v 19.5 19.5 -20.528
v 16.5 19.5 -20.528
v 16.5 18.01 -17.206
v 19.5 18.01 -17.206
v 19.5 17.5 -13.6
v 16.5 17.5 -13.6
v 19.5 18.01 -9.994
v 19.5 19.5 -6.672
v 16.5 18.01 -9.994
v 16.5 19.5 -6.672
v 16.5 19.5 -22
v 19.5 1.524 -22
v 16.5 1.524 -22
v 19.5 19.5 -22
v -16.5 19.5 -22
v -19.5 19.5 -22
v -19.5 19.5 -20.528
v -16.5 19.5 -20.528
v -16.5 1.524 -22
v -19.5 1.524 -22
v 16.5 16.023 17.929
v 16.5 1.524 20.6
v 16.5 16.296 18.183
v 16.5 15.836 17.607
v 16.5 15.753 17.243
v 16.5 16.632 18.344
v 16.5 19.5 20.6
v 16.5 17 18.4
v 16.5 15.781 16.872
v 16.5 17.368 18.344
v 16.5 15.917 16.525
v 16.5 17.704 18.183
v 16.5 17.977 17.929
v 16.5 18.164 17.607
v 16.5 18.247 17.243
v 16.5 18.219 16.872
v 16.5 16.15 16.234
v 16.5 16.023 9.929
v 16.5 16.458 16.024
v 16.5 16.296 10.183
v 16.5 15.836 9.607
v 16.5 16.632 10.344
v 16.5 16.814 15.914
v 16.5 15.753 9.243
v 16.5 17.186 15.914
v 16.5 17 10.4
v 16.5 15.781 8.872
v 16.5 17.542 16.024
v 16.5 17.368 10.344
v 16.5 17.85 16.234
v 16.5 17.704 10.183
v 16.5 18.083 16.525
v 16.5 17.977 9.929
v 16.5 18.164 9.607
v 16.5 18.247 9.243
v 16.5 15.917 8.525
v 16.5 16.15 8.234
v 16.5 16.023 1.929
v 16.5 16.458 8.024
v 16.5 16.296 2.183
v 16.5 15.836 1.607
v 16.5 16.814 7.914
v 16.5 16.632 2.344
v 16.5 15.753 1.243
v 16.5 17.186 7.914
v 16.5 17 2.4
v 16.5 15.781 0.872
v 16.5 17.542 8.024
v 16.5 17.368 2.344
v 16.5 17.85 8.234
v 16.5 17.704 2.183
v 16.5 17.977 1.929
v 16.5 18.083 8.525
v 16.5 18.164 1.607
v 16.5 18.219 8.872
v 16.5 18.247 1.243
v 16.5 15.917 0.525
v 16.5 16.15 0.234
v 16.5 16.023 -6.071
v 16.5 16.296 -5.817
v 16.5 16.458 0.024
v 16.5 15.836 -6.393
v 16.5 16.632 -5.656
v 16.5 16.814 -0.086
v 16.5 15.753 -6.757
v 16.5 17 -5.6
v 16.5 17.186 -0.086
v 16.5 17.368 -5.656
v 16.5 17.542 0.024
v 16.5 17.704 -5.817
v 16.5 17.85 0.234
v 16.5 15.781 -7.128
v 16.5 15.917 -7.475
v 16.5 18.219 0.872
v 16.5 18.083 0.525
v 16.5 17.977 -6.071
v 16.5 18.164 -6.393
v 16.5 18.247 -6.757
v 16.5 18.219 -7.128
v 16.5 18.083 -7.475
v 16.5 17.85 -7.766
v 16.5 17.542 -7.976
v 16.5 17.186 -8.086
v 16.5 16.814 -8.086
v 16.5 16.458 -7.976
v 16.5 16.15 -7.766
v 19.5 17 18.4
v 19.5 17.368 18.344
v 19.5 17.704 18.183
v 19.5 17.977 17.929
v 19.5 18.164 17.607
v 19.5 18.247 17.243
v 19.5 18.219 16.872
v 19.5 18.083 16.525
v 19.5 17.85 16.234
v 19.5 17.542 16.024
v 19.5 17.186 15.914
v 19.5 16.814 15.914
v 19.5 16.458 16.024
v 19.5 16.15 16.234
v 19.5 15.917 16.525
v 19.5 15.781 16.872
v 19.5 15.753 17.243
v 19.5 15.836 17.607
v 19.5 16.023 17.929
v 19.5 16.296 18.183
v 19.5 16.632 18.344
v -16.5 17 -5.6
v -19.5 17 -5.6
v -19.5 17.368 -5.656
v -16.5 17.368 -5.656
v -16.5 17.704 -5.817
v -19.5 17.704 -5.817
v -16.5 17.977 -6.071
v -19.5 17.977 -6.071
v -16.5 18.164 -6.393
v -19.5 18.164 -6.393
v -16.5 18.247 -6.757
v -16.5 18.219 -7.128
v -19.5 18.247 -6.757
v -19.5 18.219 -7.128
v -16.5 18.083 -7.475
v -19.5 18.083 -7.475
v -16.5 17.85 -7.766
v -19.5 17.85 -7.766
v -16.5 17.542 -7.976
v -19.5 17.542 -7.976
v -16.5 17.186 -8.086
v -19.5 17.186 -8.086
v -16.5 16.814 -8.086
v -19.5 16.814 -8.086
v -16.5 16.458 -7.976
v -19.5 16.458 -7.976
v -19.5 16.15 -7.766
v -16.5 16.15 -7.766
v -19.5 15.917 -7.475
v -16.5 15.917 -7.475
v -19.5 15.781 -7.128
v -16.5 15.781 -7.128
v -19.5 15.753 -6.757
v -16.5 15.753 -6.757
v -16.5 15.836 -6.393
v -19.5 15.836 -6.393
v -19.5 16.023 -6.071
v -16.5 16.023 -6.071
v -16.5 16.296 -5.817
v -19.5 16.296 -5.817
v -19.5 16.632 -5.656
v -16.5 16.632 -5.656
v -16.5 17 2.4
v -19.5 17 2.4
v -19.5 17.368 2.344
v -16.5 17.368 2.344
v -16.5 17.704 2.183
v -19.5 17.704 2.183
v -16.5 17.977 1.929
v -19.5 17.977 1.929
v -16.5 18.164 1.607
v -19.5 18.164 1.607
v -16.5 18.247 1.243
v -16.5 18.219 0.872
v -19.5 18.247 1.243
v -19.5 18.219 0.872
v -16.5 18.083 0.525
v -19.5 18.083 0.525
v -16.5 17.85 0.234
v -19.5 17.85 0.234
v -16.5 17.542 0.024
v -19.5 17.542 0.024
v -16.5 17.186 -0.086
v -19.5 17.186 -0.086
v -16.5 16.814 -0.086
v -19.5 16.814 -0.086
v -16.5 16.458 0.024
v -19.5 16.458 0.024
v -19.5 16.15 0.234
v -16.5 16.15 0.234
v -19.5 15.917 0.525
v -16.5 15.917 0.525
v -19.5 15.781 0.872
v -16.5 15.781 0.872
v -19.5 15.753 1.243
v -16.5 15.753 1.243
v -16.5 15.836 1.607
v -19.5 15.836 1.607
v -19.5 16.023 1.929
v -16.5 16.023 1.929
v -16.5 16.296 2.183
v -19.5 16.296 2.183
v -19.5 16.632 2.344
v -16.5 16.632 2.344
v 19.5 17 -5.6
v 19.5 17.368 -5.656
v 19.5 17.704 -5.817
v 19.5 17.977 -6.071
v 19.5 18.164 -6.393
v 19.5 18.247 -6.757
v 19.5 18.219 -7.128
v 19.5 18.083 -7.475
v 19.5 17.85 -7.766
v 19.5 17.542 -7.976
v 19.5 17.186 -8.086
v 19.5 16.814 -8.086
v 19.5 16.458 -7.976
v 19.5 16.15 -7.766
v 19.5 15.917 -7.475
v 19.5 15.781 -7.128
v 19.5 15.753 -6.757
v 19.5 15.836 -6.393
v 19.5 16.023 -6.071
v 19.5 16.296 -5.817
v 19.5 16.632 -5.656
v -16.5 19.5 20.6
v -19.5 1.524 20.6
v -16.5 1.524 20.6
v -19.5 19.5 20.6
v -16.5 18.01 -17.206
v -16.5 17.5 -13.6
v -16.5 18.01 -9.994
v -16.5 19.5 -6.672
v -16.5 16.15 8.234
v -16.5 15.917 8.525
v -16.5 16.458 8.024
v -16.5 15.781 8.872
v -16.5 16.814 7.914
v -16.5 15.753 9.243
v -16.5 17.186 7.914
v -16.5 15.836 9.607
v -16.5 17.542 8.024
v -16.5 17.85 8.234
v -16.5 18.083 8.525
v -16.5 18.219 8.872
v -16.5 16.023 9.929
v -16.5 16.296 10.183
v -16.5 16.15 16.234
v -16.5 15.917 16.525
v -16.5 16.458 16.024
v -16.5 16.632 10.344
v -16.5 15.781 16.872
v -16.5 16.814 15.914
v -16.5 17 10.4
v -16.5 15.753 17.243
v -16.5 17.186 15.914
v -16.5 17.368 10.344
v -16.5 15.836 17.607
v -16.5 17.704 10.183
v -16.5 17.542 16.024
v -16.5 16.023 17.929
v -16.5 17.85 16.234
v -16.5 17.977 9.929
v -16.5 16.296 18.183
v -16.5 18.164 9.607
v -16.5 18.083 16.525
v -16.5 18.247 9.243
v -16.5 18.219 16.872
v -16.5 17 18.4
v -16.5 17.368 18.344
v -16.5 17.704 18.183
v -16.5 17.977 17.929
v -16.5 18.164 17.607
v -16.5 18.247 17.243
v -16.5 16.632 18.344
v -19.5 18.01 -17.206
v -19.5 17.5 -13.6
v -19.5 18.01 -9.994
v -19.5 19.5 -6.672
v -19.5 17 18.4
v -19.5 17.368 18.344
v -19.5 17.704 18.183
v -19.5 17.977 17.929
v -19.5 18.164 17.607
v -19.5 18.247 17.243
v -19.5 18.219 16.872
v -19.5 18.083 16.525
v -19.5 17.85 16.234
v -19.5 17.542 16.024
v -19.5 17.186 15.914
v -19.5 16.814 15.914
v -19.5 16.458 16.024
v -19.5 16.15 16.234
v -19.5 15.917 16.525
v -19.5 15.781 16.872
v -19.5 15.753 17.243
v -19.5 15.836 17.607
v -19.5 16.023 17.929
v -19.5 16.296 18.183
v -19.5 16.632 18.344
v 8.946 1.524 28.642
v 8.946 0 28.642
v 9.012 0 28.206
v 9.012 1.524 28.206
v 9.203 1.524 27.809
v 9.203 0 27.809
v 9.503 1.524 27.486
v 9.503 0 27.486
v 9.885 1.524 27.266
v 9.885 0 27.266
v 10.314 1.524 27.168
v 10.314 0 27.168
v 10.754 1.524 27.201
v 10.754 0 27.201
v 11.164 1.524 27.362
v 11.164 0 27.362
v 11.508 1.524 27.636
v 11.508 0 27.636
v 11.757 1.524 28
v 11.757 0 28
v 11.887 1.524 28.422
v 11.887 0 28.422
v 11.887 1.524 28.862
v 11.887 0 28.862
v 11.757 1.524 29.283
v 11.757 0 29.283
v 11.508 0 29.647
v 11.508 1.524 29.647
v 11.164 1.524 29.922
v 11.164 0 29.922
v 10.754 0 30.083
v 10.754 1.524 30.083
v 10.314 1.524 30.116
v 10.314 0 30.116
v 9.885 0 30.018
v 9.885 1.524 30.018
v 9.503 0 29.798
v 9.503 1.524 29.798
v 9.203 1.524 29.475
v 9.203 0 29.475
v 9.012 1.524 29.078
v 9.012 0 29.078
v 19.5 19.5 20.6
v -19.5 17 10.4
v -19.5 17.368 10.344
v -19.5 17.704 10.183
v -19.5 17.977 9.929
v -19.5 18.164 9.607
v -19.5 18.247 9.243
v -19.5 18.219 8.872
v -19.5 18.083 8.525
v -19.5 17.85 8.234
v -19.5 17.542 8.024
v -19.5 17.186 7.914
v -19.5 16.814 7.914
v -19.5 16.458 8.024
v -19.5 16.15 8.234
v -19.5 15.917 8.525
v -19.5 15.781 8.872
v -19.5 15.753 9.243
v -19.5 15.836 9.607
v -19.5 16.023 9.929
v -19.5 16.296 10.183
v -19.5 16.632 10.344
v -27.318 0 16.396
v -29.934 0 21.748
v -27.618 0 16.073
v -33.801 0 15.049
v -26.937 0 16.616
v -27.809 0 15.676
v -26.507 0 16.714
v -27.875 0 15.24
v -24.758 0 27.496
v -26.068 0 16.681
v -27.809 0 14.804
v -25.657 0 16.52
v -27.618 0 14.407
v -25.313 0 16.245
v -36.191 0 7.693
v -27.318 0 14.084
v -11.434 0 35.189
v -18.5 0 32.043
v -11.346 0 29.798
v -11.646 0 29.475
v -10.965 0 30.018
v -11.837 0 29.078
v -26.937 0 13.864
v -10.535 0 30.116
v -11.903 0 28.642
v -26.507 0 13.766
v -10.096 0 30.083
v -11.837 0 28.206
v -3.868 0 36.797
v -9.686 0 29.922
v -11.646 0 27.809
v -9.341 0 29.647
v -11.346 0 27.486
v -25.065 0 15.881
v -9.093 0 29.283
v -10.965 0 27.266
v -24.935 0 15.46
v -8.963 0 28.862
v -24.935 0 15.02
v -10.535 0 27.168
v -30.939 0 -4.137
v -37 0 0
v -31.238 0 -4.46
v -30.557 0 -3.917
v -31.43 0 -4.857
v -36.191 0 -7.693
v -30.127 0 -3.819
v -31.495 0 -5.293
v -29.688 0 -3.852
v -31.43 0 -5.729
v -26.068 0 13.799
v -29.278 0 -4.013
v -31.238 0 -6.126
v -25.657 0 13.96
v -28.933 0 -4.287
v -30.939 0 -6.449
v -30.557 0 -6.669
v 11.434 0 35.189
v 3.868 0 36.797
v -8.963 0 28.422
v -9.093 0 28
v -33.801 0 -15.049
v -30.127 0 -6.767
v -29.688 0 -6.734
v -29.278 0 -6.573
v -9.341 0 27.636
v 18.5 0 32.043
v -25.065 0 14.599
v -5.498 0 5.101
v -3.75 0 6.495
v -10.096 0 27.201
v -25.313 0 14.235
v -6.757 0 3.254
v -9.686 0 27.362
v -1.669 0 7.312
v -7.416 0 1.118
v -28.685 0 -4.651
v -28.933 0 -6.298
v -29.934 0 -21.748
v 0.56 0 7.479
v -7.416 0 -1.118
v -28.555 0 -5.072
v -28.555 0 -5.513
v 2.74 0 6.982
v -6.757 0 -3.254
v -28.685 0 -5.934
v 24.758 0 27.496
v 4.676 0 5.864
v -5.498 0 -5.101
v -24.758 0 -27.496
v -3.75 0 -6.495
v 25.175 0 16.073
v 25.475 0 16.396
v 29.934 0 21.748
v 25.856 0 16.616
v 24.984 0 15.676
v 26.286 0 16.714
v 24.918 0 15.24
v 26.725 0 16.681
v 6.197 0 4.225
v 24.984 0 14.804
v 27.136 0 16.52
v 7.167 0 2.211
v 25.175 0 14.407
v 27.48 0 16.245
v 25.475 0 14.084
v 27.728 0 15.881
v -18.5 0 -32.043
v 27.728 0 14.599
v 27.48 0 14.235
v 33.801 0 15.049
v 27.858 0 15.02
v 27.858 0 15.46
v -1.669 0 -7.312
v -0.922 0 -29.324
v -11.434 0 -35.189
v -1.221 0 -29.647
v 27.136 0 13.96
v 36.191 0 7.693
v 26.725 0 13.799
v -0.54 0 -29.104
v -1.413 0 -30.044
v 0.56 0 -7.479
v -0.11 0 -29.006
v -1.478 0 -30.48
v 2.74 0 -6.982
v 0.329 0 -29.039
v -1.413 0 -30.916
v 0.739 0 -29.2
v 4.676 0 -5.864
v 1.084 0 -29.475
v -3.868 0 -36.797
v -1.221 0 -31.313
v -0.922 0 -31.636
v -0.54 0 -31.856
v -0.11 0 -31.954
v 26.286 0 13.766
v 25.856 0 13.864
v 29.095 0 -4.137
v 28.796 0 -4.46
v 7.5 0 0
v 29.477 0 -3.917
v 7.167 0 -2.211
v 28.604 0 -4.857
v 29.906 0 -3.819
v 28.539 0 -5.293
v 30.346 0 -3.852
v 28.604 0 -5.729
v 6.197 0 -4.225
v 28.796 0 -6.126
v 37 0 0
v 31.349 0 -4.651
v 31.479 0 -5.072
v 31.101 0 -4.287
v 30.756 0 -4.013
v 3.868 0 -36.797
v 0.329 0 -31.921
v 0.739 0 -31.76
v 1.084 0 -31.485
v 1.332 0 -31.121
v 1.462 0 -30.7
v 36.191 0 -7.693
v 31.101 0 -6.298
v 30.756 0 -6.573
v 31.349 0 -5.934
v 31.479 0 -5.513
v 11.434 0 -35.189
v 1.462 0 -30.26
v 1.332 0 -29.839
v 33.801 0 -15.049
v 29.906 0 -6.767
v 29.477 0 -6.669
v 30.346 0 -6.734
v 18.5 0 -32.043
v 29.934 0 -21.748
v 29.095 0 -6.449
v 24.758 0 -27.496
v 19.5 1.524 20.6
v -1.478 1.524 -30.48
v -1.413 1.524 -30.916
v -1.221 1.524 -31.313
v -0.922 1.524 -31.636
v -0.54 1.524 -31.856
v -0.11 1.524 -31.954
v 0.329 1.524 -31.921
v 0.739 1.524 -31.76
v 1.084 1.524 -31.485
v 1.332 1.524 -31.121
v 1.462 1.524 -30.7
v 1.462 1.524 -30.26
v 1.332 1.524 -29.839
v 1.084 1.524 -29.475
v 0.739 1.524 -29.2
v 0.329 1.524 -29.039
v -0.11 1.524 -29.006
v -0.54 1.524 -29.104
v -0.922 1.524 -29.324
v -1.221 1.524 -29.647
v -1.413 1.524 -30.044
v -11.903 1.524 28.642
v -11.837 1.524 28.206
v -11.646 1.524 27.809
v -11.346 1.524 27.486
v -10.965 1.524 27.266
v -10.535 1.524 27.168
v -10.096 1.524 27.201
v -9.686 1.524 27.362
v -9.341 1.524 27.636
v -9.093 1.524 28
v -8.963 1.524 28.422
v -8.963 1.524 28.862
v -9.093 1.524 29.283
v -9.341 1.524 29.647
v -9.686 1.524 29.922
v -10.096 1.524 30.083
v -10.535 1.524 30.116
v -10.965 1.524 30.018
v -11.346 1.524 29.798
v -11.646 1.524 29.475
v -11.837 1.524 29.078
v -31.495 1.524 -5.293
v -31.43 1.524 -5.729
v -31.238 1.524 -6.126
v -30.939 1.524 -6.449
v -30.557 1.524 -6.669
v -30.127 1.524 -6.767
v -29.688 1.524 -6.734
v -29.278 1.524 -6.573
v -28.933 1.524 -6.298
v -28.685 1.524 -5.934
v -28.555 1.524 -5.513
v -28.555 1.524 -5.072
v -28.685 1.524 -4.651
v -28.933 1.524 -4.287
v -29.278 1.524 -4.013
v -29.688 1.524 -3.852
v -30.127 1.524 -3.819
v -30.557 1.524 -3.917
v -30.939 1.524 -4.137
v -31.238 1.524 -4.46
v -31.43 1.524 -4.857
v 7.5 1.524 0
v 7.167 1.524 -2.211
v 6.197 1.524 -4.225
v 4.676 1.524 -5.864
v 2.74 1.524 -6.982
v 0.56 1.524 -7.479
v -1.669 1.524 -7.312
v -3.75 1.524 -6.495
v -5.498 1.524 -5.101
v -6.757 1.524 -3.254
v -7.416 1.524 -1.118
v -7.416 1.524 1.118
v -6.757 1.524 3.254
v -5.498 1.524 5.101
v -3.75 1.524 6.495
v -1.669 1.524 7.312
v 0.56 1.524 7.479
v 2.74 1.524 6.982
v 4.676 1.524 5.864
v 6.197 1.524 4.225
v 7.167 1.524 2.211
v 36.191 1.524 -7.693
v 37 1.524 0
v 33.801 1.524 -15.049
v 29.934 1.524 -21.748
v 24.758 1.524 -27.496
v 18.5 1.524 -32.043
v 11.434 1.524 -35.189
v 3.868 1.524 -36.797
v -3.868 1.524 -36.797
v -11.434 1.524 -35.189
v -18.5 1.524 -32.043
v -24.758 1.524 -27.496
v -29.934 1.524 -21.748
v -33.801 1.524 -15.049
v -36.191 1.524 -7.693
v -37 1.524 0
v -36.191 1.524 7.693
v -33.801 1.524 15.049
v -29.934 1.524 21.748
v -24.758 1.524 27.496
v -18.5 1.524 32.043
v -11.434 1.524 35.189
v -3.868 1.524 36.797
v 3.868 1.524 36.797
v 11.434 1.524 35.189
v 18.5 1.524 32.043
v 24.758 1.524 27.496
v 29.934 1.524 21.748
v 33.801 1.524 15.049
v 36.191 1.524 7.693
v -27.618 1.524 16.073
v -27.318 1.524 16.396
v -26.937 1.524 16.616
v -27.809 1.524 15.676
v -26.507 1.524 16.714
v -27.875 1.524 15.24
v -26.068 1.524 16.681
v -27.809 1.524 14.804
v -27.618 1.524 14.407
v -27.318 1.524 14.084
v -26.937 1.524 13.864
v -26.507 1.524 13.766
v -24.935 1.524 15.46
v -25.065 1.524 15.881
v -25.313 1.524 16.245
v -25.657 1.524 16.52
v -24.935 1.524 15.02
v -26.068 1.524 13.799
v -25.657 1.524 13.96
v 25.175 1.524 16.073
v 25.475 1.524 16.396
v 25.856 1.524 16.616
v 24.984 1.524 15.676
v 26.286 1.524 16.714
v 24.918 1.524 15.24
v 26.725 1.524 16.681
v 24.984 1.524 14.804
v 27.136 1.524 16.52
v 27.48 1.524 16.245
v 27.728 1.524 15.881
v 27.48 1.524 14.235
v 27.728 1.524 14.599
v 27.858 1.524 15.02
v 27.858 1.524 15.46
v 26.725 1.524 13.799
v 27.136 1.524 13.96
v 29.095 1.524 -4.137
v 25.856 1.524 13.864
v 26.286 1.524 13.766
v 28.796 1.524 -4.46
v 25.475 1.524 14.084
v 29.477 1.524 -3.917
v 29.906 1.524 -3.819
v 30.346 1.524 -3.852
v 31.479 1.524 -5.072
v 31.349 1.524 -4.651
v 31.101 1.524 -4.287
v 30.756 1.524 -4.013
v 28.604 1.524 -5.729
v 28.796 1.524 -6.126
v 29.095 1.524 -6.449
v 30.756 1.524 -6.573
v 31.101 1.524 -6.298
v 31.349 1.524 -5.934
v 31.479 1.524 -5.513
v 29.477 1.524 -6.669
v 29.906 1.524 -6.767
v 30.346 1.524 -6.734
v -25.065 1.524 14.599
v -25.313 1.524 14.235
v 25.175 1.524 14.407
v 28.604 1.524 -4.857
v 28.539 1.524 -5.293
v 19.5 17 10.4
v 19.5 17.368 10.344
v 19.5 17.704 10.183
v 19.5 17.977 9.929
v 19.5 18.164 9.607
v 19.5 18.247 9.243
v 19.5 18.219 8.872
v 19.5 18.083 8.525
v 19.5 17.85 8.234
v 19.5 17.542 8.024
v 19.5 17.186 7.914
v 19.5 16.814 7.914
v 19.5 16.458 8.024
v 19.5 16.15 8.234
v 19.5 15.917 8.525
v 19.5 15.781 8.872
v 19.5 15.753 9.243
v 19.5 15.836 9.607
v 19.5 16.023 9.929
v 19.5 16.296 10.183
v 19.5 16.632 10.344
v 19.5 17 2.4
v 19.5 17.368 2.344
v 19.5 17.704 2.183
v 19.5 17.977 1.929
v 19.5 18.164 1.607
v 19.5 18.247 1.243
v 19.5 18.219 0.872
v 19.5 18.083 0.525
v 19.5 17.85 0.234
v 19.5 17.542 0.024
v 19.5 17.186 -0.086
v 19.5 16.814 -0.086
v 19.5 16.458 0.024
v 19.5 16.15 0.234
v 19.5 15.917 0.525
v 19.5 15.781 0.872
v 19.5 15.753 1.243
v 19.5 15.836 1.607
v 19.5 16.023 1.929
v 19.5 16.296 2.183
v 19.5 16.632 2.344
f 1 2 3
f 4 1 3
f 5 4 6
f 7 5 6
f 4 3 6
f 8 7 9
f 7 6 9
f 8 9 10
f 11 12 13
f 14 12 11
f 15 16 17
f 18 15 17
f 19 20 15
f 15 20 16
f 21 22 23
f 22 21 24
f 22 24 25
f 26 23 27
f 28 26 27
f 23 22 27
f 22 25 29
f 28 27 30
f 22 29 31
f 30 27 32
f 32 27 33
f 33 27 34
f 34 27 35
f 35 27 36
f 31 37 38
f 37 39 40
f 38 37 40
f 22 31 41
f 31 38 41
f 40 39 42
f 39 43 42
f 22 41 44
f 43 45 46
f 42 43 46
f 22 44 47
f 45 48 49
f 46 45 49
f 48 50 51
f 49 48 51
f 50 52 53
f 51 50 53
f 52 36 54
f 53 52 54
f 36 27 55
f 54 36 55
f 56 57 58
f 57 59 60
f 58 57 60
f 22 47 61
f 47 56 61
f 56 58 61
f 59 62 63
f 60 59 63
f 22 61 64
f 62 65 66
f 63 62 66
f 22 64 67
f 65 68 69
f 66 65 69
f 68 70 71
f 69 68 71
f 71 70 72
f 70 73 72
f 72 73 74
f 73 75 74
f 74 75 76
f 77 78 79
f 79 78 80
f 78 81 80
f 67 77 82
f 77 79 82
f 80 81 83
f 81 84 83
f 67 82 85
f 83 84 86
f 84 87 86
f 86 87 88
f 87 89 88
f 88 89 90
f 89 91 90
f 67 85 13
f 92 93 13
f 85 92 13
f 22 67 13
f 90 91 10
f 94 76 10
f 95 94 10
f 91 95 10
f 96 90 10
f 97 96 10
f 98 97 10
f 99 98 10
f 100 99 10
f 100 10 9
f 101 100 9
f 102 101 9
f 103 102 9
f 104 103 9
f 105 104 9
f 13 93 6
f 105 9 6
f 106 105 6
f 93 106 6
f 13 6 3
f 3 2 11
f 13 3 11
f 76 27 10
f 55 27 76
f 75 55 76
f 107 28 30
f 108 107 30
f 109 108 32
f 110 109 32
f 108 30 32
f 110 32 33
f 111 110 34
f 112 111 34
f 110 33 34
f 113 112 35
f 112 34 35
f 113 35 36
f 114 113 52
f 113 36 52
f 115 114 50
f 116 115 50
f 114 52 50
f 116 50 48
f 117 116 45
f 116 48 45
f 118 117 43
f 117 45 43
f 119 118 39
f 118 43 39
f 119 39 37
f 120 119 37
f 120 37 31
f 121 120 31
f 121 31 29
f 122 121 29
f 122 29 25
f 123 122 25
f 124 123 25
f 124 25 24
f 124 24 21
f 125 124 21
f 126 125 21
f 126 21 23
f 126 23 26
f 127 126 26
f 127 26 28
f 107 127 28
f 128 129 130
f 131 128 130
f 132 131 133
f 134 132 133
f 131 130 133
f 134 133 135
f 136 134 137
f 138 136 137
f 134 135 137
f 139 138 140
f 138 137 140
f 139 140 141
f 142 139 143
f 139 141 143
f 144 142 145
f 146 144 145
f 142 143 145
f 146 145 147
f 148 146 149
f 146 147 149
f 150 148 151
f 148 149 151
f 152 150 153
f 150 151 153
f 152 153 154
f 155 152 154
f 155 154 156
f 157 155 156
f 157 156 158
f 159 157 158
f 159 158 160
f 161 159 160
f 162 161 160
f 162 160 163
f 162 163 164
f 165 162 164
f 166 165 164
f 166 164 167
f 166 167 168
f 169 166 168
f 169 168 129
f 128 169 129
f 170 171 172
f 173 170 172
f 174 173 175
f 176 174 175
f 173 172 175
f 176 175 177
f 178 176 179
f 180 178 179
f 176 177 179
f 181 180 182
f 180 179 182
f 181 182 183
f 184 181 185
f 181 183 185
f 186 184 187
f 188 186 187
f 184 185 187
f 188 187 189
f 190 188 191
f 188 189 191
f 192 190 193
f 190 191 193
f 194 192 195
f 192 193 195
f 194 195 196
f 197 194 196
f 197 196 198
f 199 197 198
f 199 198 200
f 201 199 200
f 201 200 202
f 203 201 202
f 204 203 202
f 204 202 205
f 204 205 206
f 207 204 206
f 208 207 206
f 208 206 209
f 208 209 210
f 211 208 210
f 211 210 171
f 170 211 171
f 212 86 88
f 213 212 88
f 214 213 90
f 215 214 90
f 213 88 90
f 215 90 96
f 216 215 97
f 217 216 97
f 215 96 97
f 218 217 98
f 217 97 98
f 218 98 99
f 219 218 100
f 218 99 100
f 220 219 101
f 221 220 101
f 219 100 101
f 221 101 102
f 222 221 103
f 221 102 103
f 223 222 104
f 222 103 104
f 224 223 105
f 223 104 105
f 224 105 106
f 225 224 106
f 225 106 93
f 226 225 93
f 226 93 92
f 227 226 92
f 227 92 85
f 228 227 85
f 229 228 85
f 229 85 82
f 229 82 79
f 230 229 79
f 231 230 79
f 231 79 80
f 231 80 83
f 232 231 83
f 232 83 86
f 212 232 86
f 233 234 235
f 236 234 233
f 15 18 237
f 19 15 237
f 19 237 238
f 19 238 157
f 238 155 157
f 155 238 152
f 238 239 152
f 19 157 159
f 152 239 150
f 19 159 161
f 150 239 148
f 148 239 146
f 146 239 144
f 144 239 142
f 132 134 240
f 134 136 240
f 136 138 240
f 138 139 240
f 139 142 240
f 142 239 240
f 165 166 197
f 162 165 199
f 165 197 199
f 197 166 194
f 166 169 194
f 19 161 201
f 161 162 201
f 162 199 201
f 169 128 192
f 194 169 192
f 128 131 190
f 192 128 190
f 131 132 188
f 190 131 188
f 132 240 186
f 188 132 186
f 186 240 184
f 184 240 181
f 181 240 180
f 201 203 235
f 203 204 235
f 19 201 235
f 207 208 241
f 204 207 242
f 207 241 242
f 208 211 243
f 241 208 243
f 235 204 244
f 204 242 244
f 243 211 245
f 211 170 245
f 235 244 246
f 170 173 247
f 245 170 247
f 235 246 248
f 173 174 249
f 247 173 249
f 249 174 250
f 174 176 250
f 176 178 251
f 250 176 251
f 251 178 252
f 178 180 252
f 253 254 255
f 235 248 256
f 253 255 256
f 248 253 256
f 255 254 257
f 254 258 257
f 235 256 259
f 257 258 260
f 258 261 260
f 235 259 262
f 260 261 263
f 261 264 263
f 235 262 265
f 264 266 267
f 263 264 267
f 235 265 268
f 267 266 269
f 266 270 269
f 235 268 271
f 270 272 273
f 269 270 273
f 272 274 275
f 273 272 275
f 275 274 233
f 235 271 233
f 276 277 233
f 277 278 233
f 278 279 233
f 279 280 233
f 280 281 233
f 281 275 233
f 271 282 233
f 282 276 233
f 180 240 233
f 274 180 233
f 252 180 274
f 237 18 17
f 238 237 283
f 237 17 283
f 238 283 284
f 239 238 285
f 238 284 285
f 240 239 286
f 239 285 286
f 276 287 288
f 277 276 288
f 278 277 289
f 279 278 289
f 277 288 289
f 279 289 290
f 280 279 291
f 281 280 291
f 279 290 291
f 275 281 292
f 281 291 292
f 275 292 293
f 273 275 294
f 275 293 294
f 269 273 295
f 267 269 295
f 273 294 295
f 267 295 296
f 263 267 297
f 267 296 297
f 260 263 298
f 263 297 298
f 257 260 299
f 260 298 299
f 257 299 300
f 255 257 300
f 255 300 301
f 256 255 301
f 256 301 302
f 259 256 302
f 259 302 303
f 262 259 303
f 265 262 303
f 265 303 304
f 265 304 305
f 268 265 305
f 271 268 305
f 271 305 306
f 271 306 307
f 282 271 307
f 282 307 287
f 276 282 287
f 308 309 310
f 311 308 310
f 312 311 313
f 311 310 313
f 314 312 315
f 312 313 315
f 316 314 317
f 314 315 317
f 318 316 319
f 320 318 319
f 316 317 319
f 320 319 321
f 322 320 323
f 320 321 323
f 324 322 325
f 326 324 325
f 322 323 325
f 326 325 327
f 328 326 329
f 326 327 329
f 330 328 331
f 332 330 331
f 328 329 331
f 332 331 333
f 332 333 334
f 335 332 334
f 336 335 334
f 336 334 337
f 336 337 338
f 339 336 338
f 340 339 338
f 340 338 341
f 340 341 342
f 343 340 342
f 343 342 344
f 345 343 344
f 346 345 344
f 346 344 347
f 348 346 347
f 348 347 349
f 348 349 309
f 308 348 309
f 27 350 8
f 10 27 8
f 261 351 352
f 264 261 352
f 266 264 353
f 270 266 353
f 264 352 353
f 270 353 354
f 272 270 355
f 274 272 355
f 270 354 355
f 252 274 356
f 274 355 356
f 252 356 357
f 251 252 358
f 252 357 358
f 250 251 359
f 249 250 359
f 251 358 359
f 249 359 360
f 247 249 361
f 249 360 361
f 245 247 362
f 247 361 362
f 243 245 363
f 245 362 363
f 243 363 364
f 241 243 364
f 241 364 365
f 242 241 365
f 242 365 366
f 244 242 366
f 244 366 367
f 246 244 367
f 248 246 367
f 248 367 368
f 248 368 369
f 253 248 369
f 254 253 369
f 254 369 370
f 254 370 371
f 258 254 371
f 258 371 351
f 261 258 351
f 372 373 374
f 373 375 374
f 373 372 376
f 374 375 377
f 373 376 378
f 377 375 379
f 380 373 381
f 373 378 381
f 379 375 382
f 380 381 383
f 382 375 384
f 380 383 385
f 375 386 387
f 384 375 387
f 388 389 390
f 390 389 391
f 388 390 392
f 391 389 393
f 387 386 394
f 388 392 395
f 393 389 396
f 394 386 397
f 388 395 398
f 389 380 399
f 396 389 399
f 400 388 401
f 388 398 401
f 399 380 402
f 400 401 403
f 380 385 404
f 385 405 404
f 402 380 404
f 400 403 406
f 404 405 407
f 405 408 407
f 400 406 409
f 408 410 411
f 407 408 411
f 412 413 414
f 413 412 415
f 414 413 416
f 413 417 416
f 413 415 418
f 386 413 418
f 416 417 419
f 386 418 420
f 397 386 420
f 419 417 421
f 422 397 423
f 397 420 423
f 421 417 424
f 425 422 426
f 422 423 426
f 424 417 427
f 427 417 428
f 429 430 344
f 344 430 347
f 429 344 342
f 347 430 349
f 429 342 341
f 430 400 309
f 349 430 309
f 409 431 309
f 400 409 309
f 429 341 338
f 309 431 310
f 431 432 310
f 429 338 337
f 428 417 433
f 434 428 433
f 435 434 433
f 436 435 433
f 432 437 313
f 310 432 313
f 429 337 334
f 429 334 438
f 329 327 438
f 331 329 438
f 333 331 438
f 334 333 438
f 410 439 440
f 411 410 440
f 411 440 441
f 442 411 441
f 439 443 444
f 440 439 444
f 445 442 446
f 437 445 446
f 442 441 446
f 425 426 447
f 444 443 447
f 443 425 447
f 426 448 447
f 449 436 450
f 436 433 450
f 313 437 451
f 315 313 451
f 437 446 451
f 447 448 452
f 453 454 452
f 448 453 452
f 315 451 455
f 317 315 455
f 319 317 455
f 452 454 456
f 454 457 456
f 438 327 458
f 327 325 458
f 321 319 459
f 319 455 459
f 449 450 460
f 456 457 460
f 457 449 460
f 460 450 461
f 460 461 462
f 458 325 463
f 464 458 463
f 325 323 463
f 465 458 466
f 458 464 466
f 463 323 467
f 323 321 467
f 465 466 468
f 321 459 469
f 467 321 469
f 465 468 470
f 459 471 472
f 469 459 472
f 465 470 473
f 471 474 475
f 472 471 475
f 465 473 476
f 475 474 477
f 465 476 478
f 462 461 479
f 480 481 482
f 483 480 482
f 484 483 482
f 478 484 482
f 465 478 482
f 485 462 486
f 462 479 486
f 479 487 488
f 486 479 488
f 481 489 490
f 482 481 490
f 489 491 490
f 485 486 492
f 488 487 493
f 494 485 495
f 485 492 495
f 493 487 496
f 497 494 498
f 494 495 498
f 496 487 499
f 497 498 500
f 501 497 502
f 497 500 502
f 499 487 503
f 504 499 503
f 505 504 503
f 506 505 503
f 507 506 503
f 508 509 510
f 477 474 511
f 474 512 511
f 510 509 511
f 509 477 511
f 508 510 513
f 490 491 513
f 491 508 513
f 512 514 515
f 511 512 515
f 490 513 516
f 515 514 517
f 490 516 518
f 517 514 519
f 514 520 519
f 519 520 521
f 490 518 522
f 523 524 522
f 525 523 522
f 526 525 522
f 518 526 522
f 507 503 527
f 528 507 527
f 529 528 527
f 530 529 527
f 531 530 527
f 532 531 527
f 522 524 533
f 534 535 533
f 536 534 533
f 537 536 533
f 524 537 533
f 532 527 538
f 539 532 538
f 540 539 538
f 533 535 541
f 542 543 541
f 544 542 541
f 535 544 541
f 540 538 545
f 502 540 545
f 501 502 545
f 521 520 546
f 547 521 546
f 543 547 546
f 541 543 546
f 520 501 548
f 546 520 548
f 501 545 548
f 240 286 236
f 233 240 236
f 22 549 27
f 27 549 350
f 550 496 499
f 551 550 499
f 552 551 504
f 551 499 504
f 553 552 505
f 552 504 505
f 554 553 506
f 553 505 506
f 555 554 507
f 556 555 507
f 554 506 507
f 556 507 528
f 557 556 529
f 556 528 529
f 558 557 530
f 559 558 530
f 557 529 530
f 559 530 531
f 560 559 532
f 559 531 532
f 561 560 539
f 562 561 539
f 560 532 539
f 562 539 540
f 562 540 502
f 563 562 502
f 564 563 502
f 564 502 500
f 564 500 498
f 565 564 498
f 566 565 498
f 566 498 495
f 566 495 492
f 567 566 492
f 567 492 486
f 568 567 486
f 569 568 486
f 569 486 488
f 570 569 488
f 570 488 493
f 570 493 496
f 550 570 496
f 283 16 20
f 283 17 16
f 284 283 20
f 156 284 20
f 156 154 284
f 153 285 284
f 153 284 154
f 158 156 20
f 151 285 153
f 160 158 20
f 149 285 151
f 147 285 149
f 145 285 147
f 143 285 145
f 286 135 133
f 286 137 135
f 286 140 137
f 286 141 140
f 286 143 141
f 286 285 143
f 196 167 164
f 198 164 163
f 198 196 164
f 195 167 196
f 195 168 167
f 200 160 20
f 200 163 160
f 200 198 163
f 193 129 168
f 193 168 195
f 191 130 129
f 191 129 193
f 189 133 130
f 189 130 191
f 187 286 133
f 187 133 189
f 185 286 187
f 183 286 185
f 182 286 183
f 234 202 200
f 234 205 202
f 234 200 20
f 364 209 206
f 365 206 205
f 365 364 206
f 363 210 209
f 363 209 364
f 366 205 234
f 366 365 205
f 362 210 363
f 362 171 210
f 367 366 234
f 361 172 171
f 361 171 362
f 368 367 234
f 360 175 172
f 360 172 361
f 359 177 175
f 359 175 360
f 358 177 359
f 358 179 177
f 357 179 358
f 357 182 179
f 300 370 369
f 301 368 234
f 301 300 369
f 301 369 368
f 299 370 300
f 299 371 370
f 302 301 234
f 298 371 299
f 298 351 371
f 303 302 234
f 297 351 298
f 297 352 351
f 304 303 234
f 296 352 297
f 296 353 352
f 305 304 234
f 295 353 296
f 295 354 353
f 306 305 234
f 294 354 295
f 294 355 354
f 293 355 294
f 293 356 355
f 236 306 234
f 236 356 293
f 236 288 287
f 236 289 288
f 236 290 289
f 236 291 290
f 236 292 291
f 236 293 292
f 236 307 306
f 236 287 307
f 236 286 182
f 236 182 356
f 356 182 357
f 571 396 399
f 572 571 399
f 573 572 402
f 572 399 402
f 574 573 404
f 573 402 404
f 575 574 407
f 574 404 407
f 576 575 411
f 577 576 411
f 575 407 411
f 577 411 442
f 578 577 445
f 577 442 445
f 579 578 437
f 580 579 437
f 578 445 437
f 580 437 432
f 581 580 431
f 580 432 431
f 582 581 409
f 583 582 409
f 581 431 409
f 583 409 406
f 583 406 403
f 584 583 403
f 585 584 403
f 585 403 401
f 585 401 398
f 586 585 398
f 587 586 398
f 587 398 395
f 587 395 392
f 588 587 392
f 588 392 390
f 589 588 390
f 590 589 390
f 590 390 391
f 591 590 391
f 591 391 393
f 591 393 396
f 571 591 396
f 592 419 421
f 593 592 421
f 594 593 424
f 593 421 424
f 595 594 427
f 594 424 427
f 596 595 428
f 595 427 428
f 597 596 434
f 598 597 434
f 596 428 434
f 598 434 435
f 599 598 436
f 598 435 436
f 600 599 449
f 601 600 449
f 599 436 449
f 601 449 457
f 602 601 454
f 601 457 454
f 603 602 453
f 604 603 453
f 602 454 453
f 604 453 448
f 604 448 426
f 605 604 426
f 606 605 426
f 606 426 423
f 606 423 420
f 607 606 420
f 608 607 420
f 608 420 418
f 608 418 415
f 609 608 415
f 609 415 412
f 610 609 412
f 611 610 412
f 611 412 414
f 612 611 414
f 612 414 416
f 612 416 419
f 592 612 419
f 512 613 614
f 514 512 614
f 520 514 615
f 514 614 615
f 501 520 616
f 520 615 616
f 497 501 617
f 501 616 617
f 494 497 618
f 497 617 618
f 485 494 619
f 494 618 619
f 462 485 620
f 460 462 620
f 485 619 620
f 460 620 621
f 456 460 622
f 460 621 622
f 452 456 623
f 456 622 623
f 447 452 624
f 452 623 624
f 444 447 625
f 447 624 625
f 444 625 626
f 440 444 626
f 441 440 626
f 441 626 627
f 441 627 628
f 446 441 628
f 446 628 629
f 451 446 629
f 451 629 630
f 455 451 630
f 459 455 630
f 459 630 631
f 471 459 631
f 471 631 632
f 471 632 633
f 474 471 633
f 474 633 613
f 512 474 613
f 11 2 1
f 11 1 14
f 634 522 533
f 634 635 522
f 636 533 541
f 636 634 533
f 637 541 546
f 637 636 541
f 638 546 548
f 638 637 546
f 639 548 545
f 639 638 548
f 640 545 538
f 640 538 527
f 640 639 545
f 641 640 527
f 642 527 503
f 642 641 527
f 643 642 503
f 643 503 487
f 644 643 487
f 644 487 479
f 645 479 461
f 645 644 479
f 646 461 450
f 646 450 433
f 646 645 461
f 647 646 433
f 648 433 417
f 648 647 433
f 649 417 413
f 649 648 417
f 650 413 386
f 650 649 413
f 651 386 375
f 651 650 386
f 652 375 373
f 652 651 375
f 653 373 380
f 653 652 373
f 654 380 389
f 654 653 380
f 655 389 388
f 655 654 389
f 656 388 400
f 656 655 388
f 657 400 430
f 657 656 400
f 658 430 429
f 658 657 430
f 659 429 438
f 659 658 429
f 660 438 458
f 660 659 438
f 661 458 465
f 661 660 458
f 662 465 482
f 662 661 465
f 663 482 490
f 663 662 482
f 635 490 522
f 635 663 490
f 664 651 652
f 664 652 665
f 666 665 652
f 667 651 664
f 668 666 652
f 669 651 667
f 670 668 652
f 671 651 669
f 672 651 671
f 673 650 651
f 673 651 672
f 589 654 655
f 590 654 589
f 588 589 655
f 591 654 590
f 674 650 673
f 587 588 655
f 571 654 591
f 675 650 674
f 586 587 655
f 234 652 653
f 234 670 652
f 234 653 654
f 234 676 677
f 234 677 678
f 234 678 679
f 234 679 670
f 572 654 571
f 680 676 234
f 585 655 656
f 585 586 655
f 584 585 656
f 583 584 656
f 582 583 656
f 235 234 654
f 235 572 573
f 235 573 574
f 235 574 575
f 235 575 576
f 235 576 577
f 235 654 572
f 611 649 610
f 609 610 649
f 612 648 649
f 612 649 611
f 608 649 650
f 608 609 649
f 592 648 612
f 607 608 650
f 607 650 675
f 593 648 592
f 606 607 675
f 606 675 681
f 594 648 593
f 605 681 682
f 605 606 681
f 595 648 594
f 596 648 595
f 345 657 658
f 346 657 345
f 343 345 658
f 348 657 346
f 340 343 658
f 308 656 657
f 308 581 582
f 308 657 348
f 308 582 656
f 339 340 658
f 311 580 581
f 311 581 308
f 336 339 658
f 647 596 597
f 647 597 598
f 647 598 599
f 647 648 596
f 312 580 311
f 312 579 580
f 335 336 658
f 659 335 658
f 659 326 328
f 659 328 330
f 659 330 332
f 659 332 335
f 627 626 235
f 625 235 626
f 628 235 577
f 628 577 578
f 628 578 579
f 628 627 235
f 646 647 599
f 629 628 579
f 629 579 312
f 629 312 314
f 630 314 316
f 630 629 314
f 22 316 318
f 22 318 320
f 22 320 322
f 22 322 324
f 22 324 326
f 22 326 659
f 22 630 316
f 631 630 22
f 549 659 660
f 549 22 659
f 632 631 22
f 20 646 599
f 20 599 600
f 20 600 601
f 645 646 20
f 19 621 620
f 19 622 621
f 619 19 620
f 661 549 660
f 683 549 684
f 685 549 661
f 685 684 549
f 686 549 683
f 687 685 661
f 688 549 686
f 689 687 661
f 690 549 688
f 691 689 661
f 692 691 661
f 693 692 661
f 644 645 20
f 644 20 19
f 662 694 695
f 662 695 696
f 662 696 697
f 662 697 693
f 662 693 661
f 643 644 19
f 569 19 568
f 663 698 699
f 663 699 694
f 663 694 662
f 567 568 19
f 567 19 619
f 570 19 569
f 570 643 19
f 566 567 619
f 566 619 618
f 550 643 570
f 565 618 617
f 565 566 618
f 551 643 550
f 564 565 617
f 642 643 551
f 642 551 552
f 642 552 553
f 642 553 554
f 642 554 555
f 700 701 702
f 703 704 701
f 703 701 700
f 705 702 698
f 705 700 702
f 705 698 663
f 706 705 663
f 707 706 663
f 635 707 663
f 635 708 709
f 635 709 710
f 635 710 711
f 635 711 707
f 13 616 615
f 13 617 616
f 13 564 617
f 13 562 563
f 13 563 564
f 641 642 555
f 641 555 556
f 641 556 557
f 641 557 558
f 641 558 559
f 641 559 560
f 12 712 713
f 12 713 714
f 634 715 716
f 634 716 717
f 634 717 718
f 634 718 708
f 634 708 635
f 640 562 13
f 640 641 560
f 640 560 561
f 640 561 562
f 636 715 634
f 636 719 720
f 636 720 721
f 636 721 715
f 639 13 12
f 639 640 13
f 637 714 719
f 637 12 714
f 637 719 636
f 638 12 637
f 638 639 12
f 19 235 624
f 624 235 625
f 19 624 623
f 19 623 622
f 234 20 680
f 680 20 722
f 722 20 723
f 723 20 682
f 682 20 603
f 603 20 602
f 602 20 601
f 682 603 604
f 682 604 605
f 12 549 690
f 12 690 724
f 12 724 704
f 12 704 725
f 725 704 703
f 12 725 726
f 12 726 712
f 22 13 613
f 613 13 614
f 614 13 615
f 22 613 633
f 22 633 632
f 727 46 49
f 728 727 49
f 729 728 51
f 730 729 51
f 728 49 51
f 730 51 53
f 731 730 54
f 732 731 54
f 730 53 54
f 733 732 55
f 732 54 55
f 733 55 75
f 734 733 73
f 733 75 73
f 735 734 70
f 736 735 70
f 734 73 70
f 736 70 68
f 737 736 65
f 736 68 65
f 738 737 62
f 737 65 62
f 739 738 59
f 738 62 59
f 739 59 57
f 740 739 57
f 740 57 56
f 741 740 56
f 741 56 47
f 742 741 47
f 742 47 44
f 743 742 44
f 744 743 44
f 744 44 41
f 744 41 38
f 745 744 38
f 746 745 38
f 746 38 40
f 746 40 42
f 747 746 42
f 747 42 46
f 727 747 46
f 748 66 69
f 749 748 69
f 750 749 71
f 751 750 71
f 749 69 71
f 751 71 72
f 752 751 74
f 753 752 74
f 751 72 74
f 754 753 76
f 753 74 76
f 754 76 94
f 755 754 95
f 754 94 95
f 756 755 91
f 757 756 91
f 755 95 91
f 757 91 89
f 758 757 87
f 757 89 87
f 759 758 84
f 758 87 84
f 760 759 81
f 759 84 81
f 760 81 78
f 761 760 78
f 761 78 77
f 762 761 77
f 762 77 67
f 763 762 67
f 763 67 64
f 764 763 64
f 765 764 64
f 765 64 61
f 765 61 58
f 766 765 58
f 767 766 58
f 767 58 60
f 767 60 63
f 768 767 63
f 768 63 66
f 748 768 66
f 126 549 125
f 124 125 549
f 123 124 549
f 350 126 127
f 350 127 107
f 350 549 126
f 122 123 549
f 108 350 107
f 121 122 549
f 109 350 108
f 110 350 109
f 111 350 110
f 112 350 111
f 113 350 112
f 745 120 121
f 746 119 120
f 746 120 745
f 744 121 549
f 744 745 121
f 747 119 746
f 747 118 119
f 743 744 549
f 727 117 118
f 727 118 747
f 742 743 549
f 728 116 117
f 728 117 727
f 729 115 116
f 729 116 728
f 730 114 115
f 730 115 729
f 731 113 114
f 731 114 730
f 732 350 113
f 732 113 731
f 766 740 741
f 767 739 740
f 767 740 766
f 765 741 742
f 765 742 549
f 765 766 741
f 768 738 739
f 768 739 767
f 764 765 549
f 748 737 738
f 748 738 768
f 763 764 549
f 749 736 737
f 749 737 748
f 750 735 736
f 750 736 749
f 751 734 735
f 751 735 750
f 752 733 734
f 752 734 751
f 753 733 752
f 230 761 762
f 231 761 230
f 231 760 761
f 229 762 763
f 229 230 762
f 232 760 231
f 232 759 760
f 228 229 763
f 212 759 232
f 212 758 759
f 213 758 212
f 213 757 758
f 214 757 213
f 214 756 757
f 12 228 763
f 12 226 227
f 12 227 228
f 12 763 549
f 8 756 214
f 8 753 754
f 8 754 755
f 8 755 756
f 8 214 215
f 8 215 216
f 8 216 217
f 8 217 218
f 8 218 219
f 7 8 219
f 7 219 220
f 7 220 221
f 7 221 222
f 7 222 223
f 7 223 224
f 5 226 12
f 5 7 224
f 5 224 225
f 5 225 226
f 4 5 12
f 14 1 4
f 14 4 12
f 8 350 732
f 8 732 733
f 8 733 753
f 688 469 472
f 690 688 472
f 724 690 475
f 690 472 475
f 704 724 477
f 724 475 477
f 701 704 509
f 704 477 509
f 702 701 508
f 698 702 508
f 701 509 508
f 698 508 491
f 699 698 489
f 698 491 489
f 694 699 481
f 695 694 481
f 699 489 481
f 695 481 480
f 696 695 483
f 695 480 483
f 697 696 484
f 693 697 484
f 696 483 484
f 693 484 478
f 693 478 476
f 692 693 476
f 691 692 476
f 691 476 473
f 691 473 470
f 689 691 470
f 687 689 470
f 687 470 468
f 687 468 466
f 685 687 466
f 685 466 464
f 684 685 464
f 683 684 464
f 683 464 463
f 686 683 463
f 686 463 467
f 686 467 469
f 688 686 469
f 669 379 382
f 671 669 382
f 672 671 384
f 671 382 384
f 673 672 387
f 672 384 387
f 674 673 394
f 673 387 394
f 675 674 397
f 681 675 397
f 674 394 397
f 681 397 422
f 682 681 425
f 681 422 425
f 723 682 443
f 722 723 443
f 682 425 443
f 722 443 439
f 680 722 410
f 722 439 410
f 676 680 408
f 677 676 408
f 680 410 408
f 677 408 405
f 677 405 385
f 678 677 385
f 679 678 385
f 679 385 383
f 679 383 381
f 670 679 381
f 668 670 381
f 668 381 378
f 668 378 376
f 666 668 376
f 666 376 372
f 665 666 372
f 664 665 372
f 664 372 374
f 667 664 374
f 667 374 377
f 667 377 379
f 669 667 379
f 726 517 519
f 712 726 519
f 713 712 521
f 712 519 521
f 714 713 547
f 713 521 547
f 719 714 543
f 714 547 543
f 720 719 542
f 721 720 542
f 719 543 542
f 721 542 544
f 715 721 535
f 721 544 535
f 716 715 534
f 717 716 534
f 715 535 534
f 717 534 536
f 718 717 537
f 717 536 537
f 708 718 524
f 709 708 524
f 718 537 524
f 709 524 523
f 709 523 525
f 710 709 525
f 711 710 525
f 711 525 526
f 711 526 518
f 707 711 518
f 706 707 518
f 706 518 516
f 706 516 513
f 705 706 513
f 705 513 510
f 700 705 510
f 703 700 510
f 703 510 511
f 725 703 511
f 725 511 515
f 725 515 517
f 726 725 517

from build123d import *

# Parameters (mm, degrees)
IZIM1_W                          = 37
IZIM1_H                          = 1.524
IZIM2_W                          = 3
IZIM2_H                          = 42.6
Y_KSEKLIK_EKSTR_ZYON1_DEPTH      = 16.276
IZIM3_W                          = 3
IZIM3_H                          = 42.6
Y_KSEKLIK_EKSTR_ZYON2_DEPTH      = 16.276
DELIK1_D                         = 2.95656
DELIK1_DEPTH                     = 1.524
F_0_15_0_15_DIAMETER_HOLE1_D     = 15
F_0_15_0_15_DIAMETER_HOLE1_DEPTH = 17.8
IZIM15_W                         = 33
IZIM15_H                         = 48.693516851
KES_EKSTR_ZYON2_DEPTH            = 16.276
IZIM16_W                         = 42.6
IZIM16_H                         = 16.276
Y_KSEKLIK_EKSTR_ZYON3_DEPTH      = 1.5
IZIM17_W                         = 42.6
IZIM17_H                         = 16.276
Y_KSEKLIK_EKSTR_ZYON4_DEPTH      = 1.5
IZIM18_W                         = 42.6
IZIM18_H                         = 1.7
Y_KSEKLIK_EKSTR_ZYON5_DEPTH      = 3
IZIM19_W                         = 42.6
IZIM19_H                         = 1.7
Y_KSEKLIK_EKSTR_ZYON6_DEPTH      = 3
IZIM20_R                         = 13
KES_EKSTR_ZYON3_DEPTH            = 39
IZIM21_R                         = 1.25
KES_EKSTR_ZYON4_DEPTH            = 39


with BuildPart() as part:
    # Çizim1 → Döndür1 (revolve)
    with BuildSketch(Plane(origin=(0, 0, 0), x_dir=(-1, 0, 0), z_dir=(0, 0, -1))):
        with Locations((-18.5, 0.762)):
            Rectangle(IZIM1_W, IZIM1_H)
    revolve(axis=Axis((0, 0, 0), (0, 1, 0)))

    # Çizim2 → Yükseklik-Ekstrüzyon1 (add)
    with BuildSketch(Plane(origin=(0, 1.524, 0), x_dir=(-1, 0, 0), z_dir=(0, 1, 0))):
        with Locations((16.5, -0.7)):
            Rectangle(IZIM2_W, IZIM2_H)
    extrude(amount=Y_KSEKLIK_EKSTR_ZYON1_DEPTH)

    # Çizim3 → Yükseklik-Ekstrüzyon2 (add)
    with BuildSketch(Plane(origin=(0, 1.524, 0), x_dir=(-1, 0, 0), z_dir=(0, 1, 0))):
        with Locations((-16.5, -0.7)):
            Rectangle(IZIM3_W, IZIM3_H)
    extrude(amount=Y_KSEKLIK_EKSTR_ZYON2_DEPTH)

    # Delik1
    with Locations(Plane(origin=(0, 1.524, 0), x_dir=(1, 0, 0), z_dir=(0, 1, 0))):
        with Locations((0, 30.48), (30.016940312, 5.292796455), (26.396454307, -15.24), (10.424773969, -28.641831082), (-10.424773969, -28.641831082), (-26.396454307, -15.24), (-30.016940312, 5.292796455)):
            Hole(DELIK1_D / 2, depth=DELIK1_DEPTH)

    # Ø0.15 (0.15) Diameter Hole1
    with Locations(Plane(origin=(0, 0, 0), x_dir=(-1, 0, 0), z_dir=(0, -1, 0))):
        with Locations((0, 0)):
            Hole(F_0_15_0_15_DIAMETER_HOLE1_D / 2, depth=F_0_15_0_15_DIAMETER_HOLE1_DEPTH)

    # Çizim15 → Kes-Ekstrüzyon2 (cut)
    with BuildSketch(Plane(origin=(0, 17.8, 0), x_dir=(1, 0, 0), z_dir=(0, 1, 0))):
        with Locations((0, 0.128603458)):
            Rectangle(IZIM15_W, IZIM15_H)
    extrude(amount=-KES_EKSTR_ZYON2_DEPTH, mode=Mode.SUBTRACT)

    # Çizim16 → Yükseklik-Ekstrüzyon3 (add)
    with BuildSketch(Plane(origin=(18, 0, 0), x_dir=(0, 0, -1), z_dir=(1, 0, 0))):
        with Locations((0.7, 9.662)):
            Rectangle(IZIM16_W, IZIM16_H)
    extrude(amount=Y_KSEKLIK_EKSTR_ZYON3_DEPTH)

    # Çizim17 → Yükseklik-Ekstrüzyon4 (add)
    with BuildSketch(Plane.ZY.offset(18)):
        with Locations((-0.7, 9.662)):
            Rectangle(IZIM17_W, IZIM17_H)
    extrude(amount=Y_KSEKLIK_EKSTR_ZYON4_DEPTH)

    # Çizim18 → Yükseklik-Ekstrüzyon5 (add)
    with BuildSketch(Plane.ZY.offset(19.5)):
        with Locations((-0.7, 18.65)):
            Rectangle(IZIM18_W, IZIM18_H)
    extrude(amount=-Y_KSEKLIK_EKSTR_ZYON5_DEPTH)

    # Çizim19 → Yükseklik-Ekstrüzyon6 (add)
    with BuildSketch(Plane(origin=(19.5, 0, 0), x_dir=(0, 0, -1), z_dir=(1, 0, 0))):
        with Locations((0.7, 18.65)):
            Rectangle(IZIM19_W, IZIM19_H)
    extrude(amount=-Y_KSEKLIK_EKSTR_ZYON6_DEPTH)

    # Çizim20 → Kes-Ekstrüzyon3 (cut)
    with BuildSketch(Plane.ZY.offset(19.5)):
        with Locations((-13.6, 30.5)):
            Circle(IZIM20_R)
    extrude(amount=-KES_EKSTR_ZYON3_DEPTH, mode=Mode.SUBTRACT)

    # Çizim21 → Kes-Ekstrüzyon4 (cut)
    with BuildSketch(Plane.ZY.offset(19.5)):
        with Locations((17.15, 17)):
            Circle(IZIM21_R)
        with Locations((9.15, 17)):
            Circle(IZIM21_R)
        with Locations((1.15, 17)):
            Circle(IZIM21_R)
        with Locations((-6.85, 17)):
            Circle(IZIM21_R)
    extrude(amount=-KES_EKSTR_ZYON4_DEPTH, mode=Mode.SUBTRACT)


solid = part.part
